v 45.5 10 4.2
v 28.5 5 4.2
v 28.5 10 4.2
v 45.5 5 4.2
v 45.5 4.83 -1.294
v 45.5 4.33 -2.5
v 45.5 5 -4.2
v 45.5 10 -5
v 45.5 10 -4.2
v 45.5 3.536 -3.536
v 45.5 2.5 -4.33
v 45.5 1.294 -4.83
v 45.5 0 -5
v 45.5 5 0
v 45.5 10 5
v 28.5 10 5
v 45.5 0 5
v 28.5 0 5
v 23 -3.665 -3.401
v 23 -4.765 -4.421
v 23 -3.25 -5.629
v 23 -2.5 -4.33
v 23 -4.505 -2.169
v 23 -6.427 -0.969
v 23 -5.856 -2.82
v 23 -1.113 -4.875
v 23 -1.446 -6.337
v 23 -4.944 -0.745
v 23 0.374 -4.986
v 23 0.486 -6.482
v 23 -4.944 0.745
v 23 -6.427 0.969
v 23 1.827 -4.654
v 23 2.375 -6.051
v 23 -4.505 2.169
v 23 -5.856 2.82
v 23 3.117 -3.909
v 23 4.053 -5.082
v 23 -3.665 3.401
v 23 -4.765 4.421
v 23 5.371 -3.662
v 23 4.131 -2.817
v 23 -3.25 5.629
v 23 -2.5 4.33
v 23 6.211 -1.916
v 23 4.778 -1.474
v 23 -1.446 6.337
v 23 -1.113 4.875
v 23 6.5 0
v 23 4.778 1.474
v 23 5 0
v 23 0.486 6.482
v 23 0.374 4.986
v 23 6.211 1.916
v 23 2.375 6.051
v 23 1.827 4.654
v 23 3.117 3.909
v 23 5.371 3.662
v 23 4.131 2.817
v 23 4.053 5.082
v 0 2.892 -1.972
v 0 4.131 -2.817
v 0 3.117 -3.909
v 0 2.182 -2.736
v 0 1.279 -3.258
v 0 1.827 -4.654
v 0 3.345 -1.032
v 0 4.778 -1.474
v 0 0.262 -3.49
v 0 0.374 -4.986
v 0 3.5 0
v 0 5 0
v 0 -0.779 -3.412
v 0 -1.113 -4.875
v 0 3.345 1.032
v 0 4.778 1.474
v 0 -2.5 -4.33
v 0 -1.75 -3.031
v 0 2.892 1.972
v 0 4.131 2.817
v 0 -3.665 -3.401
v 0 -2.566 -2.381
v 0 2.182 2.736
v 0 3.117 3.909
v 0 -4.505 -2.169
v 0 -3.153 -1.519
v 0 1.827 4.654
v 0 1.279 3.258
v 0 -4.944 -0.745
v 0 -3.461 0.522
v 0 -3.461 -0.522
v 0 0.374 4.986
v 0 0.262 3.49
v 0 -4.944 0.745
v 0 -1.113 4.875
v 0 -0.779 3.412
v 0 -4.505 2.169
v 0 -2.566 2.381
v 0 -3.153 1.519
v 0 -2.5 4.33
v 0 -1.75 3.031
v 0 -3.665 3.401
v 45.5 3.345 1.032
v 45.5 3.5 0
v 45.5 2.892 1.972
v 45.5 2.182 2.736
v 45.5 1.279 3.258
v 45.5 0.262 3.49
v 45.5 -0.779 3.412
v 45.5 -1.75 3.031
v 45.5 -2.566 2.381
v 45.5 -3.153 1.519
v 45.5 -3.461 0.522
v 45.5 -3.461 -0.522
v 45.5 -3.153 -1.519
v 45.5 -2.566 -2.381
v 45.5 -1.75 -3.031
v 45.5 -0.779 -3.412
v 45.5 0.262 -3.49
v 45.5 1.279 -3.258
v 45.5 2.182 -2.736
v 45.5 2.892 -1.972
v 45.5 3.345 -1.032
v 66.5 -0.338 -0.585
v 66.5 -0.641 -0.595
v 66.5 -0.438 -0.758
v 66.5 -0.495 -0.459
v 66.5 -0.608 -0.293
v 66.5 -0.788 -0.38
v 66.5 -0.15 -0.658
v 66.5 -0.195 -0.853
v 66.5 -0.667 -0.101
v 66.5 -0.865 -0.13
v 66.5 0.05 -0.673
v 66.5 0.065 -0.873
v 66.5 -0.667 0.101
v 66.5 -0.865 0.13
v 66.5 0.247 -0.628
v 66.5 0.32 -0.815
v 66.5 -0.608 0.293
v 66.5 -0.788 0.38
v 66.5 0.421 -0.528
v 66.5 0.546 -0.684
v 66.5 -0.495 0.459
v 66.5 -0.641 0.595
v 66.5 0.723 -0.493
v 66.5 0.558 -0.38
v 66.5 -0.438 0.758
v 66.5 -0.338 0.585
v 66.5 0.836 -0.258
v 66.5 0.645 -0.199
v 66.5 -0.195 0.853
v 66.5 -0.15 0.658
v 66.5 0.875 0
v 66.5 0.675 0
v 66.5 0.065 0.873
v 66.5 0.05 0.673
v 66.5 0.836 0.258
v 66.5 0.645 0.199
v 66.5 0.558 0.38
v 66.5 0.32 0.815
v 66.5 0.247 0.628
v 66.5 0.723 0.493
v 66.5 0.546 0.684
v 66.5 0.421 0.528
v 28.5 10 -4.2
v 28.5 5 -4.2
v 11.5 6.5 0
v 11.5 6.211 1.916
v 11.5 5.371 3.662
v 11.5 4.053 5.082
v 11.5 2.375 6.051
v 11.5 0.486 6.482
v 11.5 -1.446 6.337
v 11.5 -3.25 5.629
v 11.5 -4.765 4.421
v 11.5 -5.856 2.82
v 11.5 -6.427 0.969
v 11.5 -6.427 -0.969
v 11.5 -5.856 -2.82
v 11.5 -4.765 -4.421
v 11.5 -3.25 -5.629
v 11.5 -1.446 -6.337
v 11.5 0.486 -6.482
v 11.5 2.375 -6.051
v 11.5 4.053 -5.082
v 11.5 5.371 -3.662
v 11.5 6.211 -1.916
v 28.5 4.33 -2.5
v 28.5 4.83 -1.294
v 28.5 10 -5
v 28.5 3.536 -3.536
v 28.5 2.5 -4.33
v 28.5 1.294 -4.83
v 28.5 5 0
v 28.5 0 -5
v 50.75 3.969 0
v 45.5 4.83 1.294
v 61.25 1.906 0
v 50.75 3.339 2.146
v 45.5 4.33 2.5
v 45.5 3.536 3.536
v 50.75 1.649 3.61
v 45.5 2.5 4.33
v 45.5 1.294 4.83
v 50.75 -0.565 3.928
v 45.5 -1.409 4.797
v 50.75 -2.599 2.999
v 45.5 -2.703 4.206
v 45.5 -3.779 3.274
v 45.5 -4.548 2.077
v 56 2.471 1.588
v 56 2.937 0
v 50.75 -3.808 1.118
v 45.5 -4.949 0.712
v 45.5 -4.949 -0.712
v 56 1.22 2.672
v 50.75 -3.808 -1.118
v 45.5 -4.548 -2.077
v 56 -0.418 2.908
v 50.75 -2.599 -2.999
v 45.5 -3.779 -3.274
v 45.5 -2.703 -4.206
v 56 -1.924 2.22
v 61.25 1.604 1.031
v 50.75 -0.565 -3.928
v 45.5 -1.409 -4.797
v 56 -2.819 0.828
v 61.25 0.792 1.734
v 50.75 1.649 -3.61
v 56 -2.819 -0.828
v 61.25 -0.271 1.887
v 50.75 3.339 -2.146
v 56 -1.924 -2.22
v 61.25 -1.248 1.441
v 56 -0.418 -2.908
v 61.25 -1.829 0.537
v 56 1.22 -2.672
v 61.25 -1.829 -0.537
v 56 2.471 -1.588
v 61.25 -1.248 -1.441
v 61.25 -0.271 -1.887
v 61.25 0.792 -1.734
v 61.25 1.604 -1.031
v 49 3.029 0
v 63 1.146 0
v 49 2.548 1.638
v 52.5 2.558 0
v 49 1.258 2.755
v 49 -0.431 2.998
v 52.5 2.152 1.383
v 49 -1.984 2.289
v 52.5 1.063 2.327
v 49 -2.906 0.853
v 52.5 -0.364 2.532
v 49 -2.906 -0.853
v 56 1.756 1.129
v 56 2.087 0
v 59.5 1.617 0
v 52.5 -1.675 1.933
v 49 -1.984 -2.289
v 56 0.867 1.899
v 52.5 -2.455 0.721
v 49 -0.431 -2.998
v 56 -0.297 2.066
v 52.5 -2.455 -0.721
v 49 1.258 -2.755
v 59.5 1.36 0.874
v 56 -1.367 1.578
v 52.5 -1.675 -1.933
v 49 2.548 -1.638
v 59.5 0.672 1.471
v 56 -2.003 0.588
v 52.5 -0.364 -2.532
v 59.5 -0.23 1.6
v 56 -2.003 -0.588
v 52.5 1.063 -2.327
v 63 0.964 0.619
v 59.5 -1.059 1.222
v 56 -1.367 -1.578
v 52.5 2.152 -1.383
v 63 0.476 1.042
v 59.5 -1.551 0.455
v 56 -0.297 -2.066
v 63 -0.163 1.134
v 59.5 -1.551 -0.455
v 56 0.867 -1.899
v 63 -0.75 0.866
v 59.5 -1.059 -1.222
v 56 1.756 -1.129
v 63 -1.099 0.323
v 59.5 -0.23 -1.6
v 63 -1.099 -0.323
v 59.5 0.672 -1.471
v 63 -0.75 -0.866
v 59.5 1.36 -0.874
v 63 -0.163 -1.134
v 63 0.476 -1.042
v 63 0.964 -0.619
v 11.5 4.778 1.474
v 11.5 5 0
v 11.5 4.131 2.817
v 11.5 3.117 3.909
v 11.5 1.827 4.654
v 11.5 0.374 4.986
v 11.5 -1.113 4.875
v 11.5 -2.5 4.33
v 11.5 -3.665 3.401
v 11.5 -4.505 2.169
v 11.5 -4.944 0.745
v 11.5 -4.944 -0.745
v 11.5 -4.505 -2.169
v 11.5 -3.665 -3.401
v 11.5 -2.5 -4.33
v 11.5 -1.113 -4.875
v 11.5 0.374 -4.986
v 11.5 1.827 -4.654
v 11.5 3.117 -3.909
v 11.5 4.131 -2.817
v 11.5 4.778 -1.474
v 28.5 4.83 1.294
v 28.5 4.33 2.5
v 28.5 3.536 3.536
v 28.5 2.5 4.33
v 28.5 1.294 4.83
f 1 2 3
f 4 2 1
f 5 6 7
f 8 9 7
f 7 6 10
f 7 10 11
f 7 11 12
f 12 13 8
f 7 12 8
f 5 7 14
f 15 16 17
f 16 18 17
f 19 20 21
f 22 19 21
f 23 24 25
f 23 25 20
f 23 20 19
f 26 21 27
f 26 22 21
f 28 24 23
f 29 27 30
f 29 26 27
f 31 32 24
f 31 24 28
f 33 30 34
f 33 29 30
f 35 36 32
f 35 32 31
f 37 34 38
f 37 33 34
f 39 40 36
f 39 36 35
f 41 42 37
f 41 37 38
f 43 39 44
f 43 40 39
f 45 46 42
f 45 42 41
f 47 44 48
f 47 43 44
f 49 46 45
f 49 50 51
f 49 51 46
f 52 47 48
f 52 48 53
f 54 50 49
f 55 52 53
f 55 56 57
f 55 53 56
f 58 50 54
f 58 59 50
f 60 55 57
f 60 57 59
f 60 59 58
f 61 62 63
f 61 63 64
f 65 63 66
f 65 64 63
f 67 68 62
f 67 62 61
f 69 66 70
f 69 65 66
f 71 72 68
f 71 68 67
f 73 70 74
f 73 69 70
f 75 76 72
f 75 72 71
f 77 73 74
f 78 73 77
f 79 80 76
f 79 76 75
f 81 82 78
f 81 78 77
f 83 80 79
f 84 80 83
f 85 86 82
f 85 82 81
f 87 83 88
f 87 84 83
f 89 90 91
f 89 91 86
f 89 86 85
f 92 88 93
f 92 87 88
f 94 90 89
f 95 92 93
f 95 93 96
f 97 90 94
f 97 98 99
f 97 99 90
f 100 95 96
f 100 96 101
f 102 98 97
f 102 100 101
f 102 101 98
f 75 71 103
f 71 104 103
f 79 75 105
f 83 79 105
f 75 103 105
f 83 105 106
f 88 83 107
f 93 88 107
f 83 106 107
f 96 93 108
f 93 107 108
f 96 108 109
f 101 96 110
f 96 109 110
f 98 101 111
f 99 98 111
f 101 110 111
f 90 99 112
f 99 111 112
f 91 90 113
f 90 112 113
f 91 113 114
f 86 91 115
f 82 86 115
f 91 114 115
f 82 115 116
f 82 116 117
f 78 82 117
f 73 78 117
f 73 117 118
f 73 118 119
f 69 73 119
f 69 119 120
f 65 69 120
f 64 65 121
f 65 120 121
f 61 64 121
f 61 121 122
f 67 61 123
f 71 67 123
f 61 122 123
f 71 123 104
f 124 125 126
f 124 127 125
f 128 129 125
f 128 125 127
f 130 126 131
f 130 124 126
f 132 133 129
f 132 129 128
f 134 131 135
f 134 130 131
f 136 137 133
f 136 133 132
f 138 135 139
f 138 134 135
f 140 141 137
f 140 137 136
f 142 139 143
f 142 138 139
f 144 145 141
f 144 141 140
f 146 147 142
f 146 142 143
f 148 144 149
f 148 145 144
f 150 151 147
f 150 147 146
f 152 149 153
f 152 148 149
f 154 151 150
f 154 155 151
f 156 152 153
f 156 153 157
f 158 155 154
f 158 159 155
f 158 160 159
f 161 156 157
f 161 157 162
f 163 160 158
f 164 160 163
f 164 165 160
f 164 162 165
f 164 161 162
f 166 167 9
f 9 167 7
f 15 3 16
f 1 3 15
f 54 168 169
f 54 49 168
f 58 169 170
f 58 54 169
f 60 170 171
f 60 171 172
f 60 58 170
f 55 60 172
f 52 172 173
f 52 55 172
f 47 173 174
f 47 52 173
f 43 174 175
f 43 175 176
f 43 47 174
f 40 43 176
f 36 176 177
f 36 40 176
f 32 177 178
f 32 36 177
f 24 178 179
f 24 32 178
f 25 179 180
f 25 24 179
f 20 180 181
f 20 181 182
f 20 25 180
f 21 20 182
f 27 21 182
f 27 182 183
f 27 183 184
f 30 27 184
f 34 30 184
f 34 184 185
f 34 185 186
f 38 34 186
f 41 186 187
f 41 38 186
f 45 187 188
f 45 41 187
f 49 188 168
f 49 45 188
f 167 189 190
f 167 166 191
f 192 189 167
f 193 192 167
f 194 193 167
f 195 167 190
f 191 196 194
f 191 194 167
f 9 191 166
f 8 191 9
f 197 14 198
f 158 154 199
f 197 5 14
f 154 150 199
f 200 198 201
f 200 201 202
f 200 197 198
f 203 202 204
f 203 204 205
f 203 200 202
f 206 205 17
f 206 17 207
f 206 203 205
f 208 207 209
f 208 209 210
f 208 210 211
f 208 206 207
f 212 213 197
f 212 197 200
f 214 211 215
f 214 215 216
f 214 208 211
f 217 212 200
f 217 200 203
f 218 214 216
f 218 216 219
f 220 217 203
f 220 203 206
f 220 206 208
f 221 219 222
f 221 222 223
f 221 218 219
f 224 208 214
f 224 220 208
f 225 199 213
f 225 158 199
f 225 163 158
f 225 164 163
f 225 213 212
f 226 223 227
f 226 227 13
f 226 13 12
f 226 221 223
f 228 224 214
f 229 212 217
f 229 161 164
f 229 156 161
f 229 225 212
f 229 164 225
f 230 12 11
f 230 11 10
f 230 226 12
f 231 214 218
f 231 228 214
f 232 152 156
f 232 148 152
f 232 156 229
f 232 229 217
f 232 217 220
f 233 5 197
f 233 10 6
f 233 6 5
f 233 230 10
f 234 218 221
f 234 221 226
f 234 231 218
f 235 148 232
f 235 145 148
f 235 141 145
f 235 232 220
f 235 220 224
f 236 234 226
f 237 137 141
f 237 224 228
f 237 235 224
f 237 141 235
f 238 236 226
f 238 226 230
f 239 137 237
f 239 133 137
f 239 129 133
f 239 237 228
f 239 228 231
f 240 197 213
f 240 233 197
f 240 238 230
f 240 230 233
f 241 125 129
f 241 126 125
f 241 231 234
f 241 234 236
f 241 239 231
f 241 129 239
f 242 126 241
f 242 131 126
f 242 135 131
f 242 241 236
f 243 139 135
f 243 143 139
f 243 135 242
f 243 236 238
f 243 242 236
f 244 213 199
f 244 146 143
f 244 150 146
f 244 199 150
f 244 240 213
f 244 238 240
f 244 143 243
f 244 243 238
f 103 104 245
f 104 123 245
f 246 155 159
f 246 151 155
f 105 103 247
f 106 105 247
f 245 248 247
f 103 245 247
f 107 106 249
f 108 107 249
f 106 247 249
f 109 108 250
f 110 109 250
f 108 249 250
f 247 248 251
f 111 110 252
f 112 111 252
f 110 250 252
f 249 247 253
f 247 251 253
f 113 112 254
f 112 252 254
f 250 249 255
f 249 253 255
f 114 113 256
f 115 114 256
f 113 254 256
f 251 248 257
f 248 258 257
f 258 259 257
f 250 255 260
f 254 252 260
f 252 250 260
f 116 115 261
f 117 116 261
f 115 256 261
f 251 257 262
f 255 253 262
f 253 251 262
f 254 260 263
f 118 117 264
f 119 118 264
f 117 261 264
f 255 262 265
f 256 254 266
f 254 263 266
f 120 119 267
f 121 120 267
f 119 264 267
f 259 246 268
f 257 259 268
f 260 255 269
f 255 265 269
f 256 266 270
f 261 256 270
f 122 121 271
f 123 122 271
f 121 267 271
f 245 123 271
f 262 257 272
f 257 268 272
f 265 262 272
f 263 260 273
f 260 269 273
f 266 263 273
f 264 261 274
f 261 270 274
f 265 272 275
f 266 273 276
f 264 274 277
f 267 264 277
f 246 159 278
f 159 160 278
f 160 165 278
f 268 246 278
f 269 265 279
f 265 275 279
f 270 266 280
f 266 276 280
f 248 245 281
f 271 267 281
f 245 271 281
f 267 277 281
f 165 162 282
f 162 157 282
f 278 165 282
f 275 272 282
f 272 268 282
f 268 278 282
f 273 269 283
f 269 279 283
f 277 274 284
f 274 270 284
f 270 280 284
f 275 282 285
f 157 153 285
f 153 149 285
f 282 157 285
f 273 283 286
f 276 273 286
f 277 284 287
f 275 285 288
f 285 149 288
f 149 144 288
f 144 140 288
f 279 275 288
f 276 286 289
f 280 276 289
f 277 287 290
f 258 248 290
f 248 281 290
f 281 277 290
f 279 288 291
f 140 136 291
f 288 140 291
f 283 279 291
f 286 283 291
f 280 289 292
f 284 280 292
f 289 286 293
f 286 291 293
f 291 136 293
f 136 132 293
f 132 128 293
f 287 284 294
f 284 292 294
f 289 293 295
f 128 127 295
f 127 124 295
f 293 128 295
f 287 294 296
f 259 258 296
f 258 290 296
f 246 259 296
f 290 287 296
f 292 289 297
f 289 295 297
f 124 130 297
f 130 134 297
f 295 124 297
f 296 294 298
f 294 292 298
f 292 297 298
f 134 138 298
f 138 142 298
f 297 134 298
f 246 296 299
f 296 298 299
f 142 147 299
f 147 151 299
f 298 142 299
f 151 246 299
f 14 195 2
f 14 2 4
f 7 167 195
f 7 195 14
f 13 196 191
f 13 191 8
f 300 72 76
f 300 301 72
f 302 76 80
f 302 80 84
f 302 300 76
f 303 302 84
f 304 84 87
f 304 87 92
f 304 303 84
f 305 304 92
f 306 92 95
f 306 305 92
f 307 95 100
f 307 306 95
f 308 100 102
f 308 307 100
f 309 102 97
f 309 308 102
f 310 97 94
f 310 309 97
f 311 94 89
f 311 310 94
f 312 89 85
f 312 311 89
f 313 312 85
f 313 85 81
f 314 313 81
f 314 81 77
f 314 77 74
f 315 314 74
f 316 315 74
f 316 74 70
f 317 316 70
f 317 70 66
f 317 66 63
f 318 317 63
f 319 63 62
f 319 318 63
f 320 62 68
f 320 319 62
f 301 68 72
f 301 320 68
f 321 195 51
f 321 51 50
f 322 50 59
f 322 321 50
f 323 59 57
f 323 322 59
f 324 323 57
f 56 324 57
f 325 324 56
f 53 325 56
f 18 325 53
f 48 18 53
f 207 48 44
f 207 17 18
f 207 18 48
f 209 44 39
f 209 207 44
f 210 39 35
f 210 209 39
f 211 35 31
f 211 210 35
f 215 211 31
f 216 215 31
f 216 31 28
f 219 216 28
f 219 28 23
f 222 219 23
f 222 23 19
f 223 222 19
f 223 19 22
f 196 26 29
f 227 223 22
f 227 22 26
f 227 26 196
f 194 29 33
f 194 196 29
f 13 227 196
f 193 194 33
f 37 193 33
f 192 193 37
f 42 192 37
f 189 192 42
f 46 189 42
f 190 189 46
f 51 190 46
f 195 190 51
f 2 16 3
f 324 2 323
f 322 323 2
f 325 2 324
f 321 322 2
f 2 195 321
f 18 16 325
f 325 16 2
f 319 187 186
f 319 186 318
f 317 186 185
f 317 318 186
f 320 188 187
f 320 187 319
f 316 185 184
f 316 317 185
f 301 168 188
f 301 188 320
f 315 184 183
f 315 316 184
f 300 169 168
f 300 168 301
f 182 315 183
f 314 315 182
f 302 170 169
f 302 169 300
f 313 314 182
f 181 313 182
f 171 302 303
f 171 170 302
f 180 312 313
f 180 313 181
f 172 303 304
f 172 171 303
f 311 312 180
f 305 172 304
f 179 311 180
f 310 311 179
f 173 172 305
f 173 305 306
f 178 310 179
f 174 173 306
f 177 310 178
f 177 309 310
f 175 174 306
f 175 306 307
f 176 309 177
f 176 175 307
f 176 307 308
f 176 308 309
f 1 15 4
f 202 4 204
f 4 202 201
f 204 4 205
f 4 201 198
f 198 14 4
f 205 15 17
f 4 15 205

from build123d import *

# Parameters (mm, degrees)
SKICA2_W                = 17
SKICA2_H                = 10
P_IDAT_VYSUNUT_M1_DEPTH = 5
SKICA3_W                = 17
SKICA3_H                = 0.8
P_IDAT_VYSUNUT_M2_DEPTH = 5


with BuildPart() as part:
    # Skica1 → Rotovat1 (revolve)
    with BuildSketch(Plane.XY):
        Polygon((0, 0), (0, 5), (11.5, 5), (11.5, 6.5), (23, 6.5), (23, 5), (45.5, 5), (66.5, 0.875), (66.5, 0), align=None)
    revolve(axis=Axis((0, 0, 0), (1, 0, 0)))

    # Skica2 → Přidat vysunutím1 (add)
    with BuildSketch(Plane(origin=(0, 0, 0), x_dir=(1, 0, 0), z_dir=(0, 1, 0))):
        with Locations((37, 0)):
            Rectangle(SKICA2_W, SKICA2_H)
    extrude(amount=P_IDAT_VYSUNUT_M1_DEPTH)

    # Skica3 → Přidat vysunutím2 (add)
    with BuildSketch(Plane(origin=(0, 5, 0), x_dir=(1, 0, 0), z_dir=(0, 1, 0))):
        with Locations((37, -4.6)):
            Rectangle(SKICA3_W, SKICA3_H)
        with Locations((37, 4.6)):
            Rectangle(SKICA3_W, SKICA3_H)
    extrude(amount=P_IDAT_VYSUNUT_M2_DEPTH)

    # Skica4 → Odebrat rotací1 (revolve, cut)
    with BuildSketch(Plane.XY):
        Polygon((0, 0), (0, 3.5), (45.5, 3.5), (66.5, 0.675), (66.5, 0), align=None)
    revolve(axis=Axis((0, 0, 0), (1, 0, 0)), mode=Mode.SUBTRACT)


solid = part.part
